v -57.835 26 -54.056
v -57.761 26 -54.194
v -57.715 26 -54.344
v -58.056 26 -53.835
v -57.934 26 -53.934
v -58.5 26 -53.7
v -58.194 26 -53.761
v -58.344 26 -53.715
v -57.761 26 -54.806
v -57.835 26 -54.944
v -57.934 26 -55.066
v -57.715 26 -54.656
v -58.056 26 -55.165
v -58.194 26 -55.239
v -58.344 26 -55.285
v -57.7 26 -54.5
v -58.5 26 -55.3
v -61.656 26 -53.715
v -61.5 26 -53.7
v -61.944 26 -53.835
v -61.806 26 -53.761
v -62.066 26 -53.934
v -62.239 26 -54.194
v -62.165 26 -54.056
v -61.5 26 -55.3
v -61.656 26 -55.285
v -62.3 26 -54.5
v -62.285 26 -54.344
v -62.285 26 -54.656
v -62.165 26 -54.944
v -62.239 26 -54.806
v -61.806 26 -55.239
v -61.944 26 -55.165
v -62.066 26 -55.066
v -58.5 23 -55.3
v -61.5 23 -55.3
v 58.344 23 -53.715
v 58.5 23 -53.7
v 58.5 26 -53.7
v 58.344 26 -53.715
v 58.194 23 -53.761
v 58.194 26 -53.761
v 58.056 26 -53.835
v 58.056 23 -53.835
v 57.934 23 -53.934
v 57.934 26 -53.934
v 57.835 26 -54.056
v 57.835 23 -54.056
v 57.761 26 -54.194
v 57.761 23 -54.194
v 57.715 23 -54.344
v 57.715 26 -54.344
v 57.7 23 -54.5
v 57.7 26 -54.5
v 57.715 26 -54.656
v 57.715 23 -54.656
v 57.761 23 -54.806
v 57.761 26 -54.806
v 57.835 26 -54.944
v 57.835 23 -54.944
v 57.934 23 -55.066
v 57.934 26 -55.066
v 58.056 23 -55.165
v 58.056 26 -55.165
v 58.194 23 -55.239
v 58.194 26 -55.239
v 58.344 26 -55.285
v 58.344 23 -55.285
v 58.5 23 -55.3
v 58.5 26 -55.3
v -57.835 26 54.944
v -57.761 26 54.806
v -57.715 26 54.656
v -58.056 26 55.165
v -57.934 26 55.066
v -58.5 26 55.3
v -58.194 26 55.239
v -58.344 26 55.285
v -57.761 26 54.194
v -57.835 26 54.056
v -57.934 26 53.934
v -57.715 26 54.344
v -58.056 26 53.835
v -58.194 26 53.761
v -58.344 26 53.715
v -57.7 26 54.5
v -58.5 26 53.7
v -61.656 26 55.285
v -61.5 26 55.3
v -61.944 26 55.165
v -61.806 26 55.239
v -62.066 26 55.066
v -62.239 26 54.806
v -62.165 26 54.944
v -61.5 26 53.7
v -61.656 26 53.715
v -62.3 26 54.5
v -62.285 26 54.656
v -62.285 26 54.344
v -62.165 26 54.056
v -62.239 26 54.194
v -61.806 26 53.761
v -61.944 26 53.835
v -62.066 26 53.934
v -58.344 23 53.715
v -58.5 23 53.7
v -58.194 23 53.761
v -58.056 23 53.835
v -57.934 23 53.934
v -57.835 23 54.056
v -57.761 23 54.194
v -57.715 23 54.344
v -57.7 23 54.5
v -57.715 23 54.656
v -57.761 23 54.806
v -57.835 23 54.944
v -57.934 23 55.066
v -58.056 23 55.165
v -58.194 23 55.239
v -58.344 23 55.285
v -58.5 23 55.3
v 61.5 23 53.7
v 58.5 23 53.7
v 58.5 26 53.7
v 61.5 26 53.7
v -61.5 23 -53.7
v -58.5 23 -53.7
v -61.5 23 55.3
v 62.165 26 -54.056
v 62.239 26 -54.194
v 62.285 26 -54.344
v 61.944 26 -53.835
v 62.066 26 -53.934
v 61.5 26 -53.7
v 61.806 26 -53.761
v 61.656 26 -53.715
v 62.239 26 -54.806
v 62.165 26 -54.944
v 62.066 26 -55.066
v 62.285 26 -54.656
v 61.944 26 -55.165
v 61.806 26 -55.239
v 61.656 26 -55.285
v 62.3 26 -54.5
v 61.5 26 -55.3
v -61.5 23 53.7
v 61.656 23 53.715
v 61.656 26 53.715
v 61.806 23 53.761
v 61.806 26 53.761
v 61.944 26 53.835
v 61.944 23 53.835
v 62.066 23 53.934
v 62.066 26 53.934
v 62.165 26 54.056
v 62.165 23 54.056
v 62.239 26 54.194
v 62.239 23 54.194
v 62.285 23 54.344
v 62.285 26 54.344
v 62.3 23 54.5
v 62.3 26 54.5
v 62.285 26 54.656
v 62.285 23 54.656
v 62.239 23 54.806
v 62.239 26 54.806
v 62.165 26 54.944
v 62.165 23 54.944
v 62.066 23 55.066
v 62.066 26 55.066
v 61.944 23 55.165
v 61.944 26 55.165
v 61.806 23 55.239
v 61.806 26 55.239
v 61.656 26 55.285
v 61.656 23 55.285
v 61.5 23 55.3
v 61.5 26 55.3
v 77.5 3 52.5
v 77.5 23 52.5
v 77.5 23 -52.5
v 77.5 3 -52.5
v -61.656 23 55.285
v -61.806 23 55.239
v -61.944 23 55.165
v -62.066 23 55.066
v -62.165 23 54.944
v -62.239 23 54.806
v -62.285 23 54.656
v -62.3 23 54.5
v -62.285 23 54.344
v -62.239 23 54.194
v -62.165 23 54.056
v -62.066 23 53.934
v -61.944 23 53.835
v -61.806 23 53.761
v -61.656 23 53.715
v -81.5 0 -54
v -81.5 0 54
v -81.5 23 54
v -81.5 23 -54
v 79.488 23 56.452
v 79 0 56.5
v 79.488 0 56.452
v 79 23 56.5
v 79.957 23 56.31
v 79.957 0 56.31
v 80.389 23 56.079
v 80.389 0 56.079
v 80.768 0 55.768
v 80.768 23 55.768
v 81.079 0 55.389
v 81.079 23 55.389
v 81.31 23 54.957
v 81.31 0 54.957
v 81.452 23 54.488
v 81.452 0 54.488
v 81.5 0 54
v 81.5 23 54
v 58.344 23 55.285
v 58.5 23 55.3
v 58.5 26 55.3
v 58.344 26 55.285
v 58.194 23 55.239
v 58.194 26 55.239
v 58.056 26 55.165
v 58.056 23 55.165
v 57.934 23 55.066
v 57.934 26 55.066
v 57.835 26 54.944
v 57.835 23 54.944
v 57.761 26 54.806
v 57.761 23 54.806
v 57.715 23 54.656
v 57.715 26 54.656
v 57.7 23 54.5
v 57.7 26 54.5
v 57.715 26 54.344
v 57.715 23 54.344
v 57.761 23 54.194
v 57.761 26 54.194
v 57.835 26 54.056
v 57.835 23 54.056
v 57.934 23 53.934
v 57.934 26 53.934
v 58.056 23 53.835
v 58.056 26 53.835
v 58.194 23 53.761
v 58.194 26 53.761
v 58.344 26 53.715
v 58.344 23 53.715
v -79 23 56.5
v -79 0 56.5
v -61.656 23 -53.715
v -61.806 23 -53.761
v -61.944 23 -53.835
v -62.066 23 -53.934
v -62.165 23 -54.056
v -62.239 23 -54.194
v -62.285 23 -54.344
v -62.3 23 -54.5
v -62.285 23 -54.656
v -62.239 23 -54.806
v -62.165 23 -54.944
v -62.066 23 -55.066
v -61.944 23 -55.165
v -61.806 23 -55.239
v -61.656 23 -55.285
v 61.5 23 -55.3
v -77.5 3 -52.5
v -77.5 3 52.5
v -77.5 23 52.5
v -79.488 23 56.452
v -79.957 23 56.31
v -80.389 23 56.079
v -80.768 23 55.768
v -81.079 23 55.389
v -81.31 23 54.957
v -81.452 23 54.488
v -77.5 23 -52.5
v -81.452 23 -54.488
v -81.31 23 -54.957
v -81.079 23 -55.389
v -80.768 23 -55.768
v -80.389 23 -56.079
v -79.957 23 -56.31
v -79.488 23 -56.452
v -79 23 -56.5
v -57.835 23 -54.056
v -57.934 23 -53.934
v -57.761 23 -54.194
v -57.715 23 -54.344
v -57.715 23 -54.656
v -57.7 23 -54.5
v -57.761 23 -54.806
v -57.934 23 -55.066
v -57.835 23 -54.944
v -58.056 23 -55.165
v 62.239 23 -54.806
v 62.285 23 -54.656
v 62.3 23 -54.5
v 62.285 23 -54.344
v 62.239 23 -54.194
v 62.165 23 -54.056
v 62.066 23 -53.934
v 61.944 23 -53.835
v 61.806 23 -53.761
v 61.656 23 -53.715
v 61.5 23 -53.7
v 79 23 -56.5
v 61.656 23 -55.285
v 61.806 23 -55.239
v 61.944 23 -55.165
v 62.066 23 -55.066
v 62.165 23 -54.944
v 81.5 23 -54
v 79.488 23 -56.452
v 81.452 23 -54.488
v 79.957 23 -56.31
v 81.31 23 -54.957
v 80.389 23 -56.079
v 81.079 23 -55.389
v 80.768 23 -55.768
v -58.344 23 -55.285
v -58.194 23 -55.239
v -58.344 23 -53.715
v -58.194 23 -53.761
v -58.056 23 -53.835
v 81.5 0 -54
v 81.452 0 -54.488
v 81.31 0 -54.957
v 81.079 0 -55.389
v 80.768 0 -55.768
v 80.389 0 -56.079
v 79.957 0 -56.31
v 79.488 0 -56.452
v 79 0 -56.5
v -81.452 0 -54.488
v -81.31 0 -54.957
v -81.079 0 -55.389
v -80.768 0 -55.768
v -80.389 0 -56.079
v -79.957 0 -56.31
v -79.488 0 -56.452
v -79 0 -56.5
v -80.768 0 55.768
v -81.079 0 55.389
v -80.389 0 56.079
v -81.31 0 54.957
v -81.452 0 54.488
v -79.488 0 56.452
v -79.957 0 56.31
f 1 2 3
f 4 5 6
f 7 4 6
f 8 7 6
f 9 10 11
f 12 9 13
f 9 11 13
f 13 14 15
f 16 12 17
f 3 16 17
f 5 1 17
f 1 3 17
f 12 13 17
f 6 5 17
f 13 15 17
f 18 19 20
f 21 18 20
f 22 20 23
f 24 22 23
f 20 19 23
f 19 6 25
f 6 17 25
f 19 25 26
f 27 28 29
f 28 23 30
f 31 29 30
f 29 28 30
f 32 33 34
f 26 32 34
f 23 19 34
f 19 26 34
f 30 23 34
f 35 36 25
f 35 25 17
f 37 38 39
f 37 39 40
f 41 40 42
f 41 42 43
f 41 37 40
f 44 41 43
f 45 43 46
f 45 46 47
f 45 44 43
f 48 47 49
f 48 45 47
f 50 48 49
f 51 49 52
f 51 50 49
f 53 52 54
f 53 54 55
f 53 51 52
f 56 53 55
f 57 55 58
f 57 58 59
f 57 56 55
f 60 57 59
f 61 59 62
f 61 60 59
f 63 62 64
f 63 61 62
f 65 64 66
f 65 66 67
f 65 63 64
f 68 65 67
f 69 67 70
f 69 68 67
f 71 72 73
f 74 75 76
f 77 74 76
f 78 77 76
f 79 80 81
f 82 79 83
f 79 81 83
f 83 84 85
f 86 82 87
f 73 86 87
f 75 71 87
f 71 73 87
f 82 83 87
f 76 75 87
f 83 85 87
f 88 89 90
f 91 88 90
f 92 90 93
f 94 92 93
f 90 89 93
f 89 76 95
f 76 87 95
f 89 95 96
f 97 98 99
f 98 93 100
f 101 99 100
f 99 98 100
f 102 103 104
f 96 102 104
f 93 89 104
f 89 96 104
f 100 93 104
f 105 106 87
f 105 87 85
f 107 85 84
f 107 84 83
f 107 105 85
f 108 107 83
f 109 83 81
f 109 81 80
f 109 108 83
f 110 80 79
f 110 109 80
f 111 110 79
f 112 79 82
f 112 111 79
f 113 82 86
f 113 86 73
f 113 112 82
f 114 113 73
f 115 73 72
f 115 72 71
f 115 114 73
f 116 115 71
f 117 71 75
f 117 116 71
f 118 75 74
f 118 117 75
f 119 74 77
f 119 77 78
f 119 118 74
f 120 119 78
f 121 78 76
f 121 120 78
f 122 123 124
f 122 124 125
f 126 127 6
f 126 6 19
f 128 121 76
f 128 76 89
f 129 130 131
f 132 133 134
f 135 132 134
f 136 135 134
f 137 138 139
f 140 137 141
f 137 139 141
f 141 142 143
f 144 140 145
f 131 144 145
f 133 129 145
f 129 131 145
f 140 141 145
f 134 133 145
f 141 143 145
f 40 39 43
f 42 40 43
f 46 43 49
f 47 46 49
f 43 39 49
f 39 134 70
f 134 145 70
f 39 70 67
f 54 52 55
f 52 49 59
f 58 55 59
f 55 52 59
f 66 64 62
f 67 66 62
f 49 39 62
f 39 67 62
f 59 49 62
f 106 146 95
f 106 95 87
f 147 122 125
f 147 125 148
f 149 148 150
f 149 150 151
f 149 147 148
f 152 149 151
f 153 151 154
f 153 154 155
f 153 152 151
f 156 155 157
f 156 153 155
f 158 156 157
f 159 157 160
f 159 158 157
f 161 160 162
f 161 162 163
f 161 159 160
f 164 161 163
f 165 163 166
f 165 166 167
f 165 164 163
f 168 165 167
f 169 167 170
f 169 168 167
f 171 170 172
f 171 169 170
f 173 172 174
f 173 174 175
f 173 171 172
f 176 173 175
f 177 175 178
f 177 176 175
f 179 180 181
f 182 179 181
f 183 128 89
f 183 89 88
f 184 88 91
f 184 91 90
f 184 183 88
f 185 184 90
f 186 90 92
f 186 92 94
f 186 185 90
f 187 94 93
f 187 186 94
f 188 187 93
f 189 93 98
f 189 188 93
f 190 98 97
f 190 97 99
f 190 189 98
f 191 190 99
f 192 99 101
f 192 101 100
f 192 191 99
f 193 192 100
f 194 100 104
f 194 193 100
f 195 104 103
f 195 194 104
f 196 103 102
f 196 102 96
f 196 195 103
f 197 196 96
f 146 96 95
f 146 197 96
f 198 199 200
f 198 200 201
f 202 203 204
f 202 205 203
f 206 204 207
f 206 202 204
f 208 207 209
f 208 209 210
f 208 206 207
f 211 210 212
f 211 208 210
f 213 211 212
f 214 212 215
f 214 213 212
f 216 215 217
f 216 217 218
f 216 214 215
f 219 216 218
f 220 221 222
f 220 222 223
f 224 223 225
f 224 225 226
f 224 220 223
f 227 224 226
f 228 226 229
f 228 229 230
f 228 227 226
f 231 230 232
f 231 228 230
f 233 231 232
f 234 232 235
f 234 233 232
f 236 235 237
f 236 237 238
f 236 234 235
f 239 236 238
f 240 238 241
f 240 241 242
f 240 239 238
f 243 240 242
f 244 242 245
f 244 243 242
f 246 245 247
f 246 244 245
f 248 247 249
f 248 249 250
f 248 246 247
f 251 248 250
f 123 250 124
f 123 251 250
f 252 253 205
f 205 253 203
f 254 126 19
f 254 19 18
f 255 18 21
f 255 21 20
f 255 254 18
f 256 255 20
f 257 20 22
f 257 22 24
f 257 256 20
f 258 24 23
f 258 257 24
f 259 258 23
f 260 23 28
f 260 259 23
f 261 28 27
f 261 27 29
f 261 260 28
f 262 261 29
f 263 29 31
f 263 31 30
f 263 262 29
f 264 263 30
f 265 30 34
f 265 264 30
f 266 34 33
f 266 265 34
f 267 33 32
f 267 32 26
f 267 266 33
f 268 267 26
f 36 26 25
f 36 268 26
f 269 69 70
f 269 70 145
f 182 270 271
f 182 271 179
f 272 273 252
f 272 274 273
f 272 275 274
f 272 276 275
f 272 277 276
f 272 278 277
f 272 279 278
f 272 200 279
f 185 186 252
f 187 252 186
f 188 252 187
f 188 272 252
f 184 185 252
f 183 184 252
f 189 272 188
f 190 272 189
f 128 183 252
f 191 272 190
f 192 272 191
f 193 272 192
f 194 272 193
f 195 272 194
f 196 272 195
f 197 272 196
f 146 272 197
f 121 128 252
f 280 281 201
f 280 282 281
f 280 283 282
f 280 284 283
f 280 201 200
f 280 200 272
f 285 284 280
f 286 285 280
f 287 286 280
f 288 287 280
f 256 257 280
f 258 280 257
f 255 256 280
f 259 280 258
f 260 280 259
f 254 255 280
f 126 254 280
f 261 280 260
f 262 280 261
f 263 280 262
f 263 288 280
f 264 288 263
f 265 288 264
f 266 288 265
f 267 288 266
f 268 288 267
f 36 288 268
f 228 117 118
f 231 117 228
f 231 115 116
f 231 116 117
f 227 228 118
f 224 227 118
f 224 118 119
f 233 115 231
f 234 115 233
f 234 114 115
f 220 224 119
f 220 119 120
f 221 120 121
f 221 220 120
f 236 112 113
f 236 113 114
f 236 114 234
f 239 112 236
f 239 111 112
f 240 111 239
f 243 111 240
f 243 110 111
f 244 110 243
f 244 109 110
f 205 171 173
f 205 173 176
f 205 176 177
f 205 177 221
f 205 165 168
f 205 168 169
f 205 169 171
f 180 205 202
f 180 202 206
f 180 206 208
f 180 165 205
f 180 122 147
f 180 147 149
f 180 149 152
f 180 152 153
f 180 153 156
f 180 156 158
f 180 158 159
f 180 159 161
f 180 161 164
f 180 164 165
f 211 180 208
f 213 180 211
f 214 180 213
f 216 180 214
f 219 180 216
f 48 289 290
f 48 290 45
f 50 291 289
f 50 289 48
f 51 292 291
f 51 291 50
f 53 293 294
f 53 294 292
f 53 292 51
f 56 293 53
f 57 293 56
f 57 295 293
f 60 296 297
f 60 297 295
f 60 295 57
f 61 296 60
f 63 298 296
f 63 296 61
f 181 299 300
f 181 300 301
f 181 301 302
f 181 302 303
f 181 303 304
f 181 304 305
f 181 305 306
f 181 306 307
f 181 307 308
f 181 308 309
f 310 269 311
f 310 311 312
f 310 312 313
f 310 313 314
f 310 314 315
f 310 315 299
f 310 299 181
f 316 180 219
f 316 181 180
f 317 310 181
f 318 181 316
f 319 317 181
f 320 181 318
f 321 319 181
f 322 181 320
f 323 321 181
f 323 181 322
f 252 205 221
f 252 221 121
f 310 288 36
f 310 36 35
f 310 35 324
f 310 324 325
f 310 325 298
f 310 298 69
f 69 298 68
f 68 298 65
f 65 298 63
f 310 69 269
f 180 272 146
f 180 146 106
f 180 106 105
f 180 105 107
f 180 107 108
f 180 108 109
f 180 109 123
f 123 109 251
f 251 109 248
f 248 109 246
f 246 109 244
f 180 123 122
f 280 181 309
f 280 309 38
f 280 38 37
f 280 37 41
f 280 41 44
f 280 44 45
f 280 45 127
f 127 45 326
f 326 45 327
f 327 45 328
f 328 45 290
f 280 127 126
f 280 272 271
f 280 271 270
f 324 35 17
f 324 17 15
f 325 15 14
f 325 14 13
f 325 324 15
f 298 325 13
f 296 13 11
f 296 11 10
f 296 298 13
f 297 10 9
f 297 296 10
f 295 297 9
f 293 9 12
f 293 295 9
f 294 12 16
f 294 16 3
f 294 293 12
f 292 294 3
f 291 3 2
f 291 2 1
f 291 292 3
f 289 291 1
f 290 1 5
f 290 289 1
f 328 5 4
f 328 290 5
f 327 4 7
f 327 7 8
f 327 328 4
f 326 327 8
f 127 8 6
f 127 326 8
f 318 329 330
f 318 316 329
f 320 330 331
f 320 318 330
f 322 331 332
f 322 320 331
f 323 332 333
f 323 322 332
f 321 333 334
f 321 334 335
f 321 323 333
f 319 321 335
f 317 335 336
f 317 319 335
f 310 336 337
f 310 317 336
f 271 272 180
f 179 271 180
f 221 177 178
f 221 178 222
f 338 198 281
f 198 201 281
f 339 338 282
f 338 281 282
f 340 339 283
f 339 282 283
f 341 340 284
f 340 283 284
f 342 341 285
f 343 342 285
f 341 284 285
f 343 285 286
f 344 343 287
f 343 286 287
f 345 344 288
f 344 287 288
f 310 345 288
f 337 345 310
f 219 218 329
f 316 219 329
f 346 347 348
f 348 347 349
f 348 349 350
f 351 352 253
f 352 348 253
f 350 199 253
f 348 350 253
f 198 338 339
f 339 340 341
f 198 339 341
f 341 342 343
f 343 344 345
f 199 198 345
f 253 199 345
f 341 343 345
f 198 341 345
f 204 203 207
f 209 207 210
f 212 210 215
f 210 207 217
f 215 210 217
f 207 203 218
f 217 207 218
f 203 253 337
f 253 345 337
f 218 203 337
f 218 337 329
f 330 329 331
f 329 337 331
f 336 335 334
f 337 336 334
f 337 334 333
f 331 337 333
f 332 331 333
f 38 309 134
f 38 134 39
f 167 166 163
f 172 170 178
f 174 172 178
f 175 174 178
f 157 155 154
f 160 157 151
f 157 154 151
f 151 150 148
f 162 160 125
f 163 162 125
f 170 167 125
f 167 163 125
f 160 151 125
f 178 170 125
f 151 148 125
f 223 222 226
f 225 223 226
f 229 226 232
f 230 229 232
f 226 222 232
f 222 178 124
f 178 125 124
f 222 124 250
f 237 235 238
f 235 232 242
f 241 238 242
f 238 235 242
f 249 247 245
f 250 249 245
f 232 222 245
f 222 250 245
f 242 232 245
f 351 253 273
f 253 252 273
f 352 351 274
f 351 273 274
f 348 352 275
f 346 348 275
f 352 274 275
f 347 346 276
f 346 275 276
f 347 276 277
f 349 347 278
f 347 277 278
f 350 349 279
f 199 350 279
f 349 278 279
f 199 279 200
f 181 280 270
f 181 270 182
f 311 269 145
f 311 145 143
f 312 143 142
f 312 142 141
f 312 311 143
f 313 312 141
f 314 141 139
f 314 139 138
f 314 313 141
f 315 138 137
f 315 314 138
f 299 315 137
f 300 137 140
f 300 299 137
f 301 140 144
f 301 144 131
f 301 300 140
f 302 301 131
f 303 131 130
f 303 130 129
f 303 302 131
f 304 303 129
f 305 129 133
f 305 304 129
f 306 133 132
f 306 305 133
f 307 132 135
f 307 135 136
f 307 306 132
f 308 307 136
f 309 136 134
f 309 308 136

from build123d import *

# Parameters (mm, degrees)
SKETCH1_W           = 163
SKETCH1_H           = 113
OUTERCUT_DEPTH      = 23
FILLET2_R           = 2.5
FILLET3_R           = 2.5
SKETCH2_W           = 155
SKETCH2_H           = 105
INNERCUT_DEPTH      = 20
BOSS_EXTRUDE5_DEPTH = 3


with BuildPart() as part:
    # Sketch1 → OuterCut (new body)
    with BuildSketch(Plane(origin=(0, 0, 0), x_dir=(1, 0, 0), z_dir=(0, 1, 0))):
        Rectangle(SKETCH1_W, SKETCH1_H)
    extrude(amount=OUTERCUT_DEPTH)

    # Fillet2
    fillet2_edges = [part.edges().sort_by_distance(p)[0] for p in [
        (81.5, 11.5, 56.5),
    ]]
    fillet(fillet2_edges, radius=FILLET2_R)

    # Fillet3
    fillet3_edges = [part.edges().sort_by_distance(p)[0] for p in [
        (-81.5, 11.5, 56.5),
        (-81.5, 11.5, -56.5),
        (81.5, 11.5, -56.5),
    ]]
    fillet(fillet3_edges, radius=FILLET3_R)

    # Sketch2 → InnerCut (cut)
    with BuildSketch(Plane(origin=(0, 23, 0), x_dir=(1, 0, 0), z_dir=(0, 1, 0))):
        Rectangle(SKETCH2_W, SKETCH2_H)
    extrude(amount=-INNERCUT_DEPTH, mode=Mode.SUBTRACT)

    # Sketch9 → Boss-Extrude5 (add)
    with BuildSketch(Plane(origin=(0, 23, 0), x_dir=(1, 0, 0), z_dir=(0, 1, 0))):
        with BuildLine():
            Line((58.5, -53.7), (61.5, -53.7))
            ThreePointArc((61.5, -53.7), (62.3, -54.5), (61.5, -55.3))
            Line((61.5, -55.3), (58.5, -55.3))
            ThreePointArc((58.5, -55.3), (57.7, -54.5), (58.5, -53.7))
        make_face()
        with BuildLine():
            Line((-61.5, -53.7), (-58.5, -53.7))
            ThreePointArc((-58.5, -53.7), (-57.7, -54.5), (-58.5, -55.3))
            Line((-58.5, -55.3), (-61.5, -55.3))
            ThreePointArc((-61.5, -55.3), (-62.3, -54.5), (-61.5, -53.7))
        make_face()
        with BuildLine():
            Line((-61.5, 55.3), (-58.5, 55.3))
            ThreePointArc((-58.5, 55.3), (-57.7, 54.5), (-58.5, 53.7))
            Line((-58.5, 53.7), (-61.5, 53.7))
            ThreePointArc((-61.5, 53.7), (-62.3, 54.5), (-61.5, 55.3))
        make_face()
        with BuildLine():
            Line((58.5, 55.3), (61.5, 55.3))
            ThreePointArc((61.5, 55.3), (62.3, 54.5), (61.5, 53.7))
            Line((61.5, 53.7), (58.5, 53.7))
            ThreePointArc((58.5, 53.7), (57.7, 54.5), (58.5, 55.3))
        make_face()
    extrude(amount=BOSS_EXTRUDE5_DEPTH)


solid = part.part
